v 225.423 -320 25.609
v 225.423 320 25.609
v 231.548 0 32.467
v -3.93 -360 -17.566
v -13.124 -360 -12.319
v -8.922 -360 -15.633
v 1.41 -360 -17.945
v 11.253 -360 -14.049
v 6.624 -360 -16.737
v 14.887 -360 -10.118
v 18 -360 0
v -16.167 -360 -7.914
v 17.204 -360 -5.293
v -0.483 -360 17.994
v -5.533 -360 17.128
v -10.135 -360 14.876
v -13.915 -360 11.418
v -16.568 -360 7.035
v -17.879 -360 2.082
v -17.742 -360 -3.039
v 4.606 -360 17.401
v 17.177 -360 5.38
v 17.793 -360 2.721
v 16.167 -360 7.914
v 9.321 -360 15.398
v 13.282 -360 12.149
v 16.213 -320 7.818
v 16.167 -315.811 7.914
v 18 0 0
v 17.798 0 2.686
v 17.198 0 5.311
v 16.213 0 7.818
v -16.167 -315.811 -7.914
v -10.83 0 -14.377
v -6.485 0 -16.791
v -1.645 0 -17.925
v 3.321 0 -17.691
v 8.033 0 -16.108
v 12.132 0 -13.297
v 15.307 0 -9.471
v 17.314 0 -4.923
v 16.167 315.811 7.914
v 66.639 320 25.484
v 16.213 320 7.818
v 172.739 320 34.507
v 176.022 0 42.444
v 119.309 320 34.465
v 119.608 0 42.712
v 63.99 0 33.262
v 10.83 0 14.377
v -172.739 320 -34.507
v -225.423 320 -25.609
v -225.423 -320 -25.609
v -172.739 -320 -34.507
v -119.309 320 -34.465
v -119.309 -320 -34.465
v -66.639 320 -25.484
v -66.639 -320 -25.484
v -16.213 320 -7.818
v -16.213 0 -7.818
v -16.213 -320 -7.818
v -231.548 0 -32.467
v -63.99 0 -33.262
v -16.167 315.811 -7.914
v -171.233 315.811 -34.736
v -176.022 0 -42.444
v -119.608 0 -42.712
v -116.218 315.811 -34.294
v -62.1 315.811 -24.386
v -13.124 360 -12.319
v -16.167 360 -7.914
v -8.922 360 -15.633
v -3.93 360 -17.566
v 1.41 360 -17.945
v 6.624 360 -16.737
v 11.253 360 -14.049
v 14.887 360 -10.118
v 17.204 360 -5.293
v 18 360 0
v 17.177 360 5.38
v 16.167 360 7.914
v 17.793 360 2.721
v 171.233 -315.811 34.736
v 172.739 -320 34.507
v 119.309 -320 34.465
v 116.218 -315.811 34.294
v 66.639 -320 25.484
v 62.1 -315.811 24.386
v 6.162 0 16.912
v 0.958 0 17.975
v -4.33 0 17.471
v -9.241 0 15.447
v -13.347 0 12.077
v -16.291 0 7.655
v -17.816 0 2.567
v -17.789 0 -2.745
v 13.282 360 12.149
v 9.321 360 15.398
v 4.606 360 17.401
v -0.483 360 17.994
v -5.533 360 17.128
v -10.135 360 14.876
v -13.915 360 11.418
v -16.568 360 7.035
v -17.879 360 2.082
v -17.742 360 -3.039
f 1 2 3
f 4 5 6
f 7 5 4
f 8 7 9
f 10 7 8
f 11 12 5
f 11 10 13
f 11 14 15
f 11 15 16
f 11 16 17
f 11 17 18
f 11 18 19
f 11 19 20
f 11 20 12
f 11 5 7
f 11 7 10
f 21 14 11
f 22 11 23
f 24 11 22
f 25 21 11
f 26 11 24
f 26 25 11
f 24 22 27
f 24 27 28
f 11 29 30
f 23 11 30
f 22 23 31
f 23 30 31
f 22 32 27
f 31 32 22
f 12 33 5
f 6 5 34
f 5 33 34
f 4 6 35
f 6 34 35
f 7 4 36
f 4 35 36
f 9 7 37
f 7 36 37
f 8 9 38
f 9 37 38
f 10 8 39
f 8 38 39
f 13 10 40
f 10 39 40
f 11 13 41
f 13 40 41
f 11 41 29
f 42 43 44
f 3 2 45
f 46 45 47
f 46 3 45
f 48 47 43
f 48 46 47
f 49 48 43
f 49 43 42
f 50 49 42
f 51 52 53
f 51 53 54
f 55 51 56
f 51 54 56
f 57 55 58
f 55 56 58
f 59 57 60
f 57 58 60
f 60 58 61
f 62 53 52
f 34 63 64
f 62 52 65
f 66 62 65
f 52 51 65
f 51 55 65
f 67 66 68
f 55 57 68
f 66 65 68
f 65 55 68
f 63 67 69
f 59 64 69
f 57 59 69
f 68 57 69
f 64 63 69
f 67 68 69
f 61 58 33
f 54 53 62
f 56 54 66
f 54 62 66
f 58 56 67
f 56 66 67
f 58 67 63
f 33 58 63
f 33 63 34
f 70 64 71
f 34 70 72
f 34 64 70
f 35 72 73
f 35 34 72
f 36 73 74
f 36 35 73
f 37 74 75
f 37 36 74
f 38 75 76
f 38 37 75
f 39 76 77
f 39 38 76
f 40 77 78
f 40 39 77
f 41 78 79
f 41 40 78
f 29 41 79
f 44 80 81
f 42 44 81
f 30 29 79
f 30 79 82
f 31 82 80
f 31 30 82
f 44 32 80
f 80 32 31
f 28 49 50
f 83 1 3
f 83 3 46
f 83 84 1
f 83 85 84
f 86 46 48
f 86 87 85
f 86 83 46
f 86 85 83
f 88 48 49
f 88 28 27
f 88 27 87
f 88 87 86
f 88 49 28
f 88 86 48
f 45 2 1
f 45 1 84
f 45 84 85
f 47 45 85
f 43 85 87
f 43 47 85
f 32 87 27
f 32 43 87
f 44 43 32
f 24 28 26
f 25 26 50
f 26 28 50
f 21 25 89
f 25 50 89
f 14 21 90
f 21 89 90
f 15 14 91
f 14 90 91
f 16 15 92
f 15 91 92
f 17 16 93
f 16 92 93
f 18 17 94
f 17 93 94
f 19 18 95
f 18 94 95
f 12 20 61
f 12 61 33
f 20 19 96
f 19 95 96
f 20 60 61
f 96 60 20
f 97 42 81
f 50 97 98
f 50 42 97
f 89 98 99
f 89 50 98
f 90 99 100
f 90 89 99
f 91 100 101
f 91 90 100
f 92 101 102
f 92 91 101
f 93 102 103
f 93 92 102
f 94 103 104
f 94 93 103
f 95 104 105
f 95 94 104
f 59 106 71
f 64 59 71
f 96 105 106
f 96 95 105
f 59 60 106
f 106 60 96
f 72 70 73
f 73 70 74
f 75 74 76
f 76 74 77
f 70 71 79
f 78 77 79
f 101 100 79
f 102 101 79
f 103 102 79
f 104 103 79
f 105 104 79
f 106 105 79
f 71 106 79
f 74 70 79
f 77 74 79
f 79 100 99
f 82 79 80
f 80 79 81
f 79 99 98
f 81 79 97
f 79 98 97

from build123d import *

# Parameters (mm, degrees)
F4_DEPTH = 360


with BuildPart() as f2:
    # F2: sweep along a path in F0
    with BuildLine(Plane.XZ) as f2_path:
        ThreePointArc((242.7527745604, 20.7435647383), (128.2776322592, 35.2070479661), (16.1666904568, 7.9144247848))
    # F1 (on Right) → F2 (sweep)
    with BuildSketch(Plane.YZ):
        Polygon((-320, 0), (0, 0), (320, 0), (0, 9.1953519732), align=None)
    sweep(path=f2_path.line)

    # F3: sweep along a path in F0
    with BuildLine(Plane.XZ) as f3_path:
        ThreePointArc((-242.7527745604, -20.7435647383), (-128.2776322592, -35.2070479661), (-16.1666904568, -7.9144247848))
    # F1 (on Right) → F3 (sweep)
    with BuildSketch(Plane.YZ):
        Polygon((320, 0), (0, 0), (-320, 0), (0, -9.1953519732), align=None)
    sweep(path=f3_path.line)

    # F0 (on Front) → F4 (join, symmetric)
    with BuildSketch(Plane.XZ):
        with BuildLine():
            ThreePointArc((-16.1666904568, -7.9144247848), (4.061992847, -17.5356840218), (18, 0))
            ThreePointArc((18, 0), (17.5356840218, 4.061992847), (16.1666904568, 7.9144247848))
            ThreePointArc((16.1666904568, 7.9144247848), (-7.9144247848, 16.1666904568), (-16.1666904568, -7.9144247848))
        make_face()
    extrude(amount=F4_DEPTH, both=True)


solid = f2.part
